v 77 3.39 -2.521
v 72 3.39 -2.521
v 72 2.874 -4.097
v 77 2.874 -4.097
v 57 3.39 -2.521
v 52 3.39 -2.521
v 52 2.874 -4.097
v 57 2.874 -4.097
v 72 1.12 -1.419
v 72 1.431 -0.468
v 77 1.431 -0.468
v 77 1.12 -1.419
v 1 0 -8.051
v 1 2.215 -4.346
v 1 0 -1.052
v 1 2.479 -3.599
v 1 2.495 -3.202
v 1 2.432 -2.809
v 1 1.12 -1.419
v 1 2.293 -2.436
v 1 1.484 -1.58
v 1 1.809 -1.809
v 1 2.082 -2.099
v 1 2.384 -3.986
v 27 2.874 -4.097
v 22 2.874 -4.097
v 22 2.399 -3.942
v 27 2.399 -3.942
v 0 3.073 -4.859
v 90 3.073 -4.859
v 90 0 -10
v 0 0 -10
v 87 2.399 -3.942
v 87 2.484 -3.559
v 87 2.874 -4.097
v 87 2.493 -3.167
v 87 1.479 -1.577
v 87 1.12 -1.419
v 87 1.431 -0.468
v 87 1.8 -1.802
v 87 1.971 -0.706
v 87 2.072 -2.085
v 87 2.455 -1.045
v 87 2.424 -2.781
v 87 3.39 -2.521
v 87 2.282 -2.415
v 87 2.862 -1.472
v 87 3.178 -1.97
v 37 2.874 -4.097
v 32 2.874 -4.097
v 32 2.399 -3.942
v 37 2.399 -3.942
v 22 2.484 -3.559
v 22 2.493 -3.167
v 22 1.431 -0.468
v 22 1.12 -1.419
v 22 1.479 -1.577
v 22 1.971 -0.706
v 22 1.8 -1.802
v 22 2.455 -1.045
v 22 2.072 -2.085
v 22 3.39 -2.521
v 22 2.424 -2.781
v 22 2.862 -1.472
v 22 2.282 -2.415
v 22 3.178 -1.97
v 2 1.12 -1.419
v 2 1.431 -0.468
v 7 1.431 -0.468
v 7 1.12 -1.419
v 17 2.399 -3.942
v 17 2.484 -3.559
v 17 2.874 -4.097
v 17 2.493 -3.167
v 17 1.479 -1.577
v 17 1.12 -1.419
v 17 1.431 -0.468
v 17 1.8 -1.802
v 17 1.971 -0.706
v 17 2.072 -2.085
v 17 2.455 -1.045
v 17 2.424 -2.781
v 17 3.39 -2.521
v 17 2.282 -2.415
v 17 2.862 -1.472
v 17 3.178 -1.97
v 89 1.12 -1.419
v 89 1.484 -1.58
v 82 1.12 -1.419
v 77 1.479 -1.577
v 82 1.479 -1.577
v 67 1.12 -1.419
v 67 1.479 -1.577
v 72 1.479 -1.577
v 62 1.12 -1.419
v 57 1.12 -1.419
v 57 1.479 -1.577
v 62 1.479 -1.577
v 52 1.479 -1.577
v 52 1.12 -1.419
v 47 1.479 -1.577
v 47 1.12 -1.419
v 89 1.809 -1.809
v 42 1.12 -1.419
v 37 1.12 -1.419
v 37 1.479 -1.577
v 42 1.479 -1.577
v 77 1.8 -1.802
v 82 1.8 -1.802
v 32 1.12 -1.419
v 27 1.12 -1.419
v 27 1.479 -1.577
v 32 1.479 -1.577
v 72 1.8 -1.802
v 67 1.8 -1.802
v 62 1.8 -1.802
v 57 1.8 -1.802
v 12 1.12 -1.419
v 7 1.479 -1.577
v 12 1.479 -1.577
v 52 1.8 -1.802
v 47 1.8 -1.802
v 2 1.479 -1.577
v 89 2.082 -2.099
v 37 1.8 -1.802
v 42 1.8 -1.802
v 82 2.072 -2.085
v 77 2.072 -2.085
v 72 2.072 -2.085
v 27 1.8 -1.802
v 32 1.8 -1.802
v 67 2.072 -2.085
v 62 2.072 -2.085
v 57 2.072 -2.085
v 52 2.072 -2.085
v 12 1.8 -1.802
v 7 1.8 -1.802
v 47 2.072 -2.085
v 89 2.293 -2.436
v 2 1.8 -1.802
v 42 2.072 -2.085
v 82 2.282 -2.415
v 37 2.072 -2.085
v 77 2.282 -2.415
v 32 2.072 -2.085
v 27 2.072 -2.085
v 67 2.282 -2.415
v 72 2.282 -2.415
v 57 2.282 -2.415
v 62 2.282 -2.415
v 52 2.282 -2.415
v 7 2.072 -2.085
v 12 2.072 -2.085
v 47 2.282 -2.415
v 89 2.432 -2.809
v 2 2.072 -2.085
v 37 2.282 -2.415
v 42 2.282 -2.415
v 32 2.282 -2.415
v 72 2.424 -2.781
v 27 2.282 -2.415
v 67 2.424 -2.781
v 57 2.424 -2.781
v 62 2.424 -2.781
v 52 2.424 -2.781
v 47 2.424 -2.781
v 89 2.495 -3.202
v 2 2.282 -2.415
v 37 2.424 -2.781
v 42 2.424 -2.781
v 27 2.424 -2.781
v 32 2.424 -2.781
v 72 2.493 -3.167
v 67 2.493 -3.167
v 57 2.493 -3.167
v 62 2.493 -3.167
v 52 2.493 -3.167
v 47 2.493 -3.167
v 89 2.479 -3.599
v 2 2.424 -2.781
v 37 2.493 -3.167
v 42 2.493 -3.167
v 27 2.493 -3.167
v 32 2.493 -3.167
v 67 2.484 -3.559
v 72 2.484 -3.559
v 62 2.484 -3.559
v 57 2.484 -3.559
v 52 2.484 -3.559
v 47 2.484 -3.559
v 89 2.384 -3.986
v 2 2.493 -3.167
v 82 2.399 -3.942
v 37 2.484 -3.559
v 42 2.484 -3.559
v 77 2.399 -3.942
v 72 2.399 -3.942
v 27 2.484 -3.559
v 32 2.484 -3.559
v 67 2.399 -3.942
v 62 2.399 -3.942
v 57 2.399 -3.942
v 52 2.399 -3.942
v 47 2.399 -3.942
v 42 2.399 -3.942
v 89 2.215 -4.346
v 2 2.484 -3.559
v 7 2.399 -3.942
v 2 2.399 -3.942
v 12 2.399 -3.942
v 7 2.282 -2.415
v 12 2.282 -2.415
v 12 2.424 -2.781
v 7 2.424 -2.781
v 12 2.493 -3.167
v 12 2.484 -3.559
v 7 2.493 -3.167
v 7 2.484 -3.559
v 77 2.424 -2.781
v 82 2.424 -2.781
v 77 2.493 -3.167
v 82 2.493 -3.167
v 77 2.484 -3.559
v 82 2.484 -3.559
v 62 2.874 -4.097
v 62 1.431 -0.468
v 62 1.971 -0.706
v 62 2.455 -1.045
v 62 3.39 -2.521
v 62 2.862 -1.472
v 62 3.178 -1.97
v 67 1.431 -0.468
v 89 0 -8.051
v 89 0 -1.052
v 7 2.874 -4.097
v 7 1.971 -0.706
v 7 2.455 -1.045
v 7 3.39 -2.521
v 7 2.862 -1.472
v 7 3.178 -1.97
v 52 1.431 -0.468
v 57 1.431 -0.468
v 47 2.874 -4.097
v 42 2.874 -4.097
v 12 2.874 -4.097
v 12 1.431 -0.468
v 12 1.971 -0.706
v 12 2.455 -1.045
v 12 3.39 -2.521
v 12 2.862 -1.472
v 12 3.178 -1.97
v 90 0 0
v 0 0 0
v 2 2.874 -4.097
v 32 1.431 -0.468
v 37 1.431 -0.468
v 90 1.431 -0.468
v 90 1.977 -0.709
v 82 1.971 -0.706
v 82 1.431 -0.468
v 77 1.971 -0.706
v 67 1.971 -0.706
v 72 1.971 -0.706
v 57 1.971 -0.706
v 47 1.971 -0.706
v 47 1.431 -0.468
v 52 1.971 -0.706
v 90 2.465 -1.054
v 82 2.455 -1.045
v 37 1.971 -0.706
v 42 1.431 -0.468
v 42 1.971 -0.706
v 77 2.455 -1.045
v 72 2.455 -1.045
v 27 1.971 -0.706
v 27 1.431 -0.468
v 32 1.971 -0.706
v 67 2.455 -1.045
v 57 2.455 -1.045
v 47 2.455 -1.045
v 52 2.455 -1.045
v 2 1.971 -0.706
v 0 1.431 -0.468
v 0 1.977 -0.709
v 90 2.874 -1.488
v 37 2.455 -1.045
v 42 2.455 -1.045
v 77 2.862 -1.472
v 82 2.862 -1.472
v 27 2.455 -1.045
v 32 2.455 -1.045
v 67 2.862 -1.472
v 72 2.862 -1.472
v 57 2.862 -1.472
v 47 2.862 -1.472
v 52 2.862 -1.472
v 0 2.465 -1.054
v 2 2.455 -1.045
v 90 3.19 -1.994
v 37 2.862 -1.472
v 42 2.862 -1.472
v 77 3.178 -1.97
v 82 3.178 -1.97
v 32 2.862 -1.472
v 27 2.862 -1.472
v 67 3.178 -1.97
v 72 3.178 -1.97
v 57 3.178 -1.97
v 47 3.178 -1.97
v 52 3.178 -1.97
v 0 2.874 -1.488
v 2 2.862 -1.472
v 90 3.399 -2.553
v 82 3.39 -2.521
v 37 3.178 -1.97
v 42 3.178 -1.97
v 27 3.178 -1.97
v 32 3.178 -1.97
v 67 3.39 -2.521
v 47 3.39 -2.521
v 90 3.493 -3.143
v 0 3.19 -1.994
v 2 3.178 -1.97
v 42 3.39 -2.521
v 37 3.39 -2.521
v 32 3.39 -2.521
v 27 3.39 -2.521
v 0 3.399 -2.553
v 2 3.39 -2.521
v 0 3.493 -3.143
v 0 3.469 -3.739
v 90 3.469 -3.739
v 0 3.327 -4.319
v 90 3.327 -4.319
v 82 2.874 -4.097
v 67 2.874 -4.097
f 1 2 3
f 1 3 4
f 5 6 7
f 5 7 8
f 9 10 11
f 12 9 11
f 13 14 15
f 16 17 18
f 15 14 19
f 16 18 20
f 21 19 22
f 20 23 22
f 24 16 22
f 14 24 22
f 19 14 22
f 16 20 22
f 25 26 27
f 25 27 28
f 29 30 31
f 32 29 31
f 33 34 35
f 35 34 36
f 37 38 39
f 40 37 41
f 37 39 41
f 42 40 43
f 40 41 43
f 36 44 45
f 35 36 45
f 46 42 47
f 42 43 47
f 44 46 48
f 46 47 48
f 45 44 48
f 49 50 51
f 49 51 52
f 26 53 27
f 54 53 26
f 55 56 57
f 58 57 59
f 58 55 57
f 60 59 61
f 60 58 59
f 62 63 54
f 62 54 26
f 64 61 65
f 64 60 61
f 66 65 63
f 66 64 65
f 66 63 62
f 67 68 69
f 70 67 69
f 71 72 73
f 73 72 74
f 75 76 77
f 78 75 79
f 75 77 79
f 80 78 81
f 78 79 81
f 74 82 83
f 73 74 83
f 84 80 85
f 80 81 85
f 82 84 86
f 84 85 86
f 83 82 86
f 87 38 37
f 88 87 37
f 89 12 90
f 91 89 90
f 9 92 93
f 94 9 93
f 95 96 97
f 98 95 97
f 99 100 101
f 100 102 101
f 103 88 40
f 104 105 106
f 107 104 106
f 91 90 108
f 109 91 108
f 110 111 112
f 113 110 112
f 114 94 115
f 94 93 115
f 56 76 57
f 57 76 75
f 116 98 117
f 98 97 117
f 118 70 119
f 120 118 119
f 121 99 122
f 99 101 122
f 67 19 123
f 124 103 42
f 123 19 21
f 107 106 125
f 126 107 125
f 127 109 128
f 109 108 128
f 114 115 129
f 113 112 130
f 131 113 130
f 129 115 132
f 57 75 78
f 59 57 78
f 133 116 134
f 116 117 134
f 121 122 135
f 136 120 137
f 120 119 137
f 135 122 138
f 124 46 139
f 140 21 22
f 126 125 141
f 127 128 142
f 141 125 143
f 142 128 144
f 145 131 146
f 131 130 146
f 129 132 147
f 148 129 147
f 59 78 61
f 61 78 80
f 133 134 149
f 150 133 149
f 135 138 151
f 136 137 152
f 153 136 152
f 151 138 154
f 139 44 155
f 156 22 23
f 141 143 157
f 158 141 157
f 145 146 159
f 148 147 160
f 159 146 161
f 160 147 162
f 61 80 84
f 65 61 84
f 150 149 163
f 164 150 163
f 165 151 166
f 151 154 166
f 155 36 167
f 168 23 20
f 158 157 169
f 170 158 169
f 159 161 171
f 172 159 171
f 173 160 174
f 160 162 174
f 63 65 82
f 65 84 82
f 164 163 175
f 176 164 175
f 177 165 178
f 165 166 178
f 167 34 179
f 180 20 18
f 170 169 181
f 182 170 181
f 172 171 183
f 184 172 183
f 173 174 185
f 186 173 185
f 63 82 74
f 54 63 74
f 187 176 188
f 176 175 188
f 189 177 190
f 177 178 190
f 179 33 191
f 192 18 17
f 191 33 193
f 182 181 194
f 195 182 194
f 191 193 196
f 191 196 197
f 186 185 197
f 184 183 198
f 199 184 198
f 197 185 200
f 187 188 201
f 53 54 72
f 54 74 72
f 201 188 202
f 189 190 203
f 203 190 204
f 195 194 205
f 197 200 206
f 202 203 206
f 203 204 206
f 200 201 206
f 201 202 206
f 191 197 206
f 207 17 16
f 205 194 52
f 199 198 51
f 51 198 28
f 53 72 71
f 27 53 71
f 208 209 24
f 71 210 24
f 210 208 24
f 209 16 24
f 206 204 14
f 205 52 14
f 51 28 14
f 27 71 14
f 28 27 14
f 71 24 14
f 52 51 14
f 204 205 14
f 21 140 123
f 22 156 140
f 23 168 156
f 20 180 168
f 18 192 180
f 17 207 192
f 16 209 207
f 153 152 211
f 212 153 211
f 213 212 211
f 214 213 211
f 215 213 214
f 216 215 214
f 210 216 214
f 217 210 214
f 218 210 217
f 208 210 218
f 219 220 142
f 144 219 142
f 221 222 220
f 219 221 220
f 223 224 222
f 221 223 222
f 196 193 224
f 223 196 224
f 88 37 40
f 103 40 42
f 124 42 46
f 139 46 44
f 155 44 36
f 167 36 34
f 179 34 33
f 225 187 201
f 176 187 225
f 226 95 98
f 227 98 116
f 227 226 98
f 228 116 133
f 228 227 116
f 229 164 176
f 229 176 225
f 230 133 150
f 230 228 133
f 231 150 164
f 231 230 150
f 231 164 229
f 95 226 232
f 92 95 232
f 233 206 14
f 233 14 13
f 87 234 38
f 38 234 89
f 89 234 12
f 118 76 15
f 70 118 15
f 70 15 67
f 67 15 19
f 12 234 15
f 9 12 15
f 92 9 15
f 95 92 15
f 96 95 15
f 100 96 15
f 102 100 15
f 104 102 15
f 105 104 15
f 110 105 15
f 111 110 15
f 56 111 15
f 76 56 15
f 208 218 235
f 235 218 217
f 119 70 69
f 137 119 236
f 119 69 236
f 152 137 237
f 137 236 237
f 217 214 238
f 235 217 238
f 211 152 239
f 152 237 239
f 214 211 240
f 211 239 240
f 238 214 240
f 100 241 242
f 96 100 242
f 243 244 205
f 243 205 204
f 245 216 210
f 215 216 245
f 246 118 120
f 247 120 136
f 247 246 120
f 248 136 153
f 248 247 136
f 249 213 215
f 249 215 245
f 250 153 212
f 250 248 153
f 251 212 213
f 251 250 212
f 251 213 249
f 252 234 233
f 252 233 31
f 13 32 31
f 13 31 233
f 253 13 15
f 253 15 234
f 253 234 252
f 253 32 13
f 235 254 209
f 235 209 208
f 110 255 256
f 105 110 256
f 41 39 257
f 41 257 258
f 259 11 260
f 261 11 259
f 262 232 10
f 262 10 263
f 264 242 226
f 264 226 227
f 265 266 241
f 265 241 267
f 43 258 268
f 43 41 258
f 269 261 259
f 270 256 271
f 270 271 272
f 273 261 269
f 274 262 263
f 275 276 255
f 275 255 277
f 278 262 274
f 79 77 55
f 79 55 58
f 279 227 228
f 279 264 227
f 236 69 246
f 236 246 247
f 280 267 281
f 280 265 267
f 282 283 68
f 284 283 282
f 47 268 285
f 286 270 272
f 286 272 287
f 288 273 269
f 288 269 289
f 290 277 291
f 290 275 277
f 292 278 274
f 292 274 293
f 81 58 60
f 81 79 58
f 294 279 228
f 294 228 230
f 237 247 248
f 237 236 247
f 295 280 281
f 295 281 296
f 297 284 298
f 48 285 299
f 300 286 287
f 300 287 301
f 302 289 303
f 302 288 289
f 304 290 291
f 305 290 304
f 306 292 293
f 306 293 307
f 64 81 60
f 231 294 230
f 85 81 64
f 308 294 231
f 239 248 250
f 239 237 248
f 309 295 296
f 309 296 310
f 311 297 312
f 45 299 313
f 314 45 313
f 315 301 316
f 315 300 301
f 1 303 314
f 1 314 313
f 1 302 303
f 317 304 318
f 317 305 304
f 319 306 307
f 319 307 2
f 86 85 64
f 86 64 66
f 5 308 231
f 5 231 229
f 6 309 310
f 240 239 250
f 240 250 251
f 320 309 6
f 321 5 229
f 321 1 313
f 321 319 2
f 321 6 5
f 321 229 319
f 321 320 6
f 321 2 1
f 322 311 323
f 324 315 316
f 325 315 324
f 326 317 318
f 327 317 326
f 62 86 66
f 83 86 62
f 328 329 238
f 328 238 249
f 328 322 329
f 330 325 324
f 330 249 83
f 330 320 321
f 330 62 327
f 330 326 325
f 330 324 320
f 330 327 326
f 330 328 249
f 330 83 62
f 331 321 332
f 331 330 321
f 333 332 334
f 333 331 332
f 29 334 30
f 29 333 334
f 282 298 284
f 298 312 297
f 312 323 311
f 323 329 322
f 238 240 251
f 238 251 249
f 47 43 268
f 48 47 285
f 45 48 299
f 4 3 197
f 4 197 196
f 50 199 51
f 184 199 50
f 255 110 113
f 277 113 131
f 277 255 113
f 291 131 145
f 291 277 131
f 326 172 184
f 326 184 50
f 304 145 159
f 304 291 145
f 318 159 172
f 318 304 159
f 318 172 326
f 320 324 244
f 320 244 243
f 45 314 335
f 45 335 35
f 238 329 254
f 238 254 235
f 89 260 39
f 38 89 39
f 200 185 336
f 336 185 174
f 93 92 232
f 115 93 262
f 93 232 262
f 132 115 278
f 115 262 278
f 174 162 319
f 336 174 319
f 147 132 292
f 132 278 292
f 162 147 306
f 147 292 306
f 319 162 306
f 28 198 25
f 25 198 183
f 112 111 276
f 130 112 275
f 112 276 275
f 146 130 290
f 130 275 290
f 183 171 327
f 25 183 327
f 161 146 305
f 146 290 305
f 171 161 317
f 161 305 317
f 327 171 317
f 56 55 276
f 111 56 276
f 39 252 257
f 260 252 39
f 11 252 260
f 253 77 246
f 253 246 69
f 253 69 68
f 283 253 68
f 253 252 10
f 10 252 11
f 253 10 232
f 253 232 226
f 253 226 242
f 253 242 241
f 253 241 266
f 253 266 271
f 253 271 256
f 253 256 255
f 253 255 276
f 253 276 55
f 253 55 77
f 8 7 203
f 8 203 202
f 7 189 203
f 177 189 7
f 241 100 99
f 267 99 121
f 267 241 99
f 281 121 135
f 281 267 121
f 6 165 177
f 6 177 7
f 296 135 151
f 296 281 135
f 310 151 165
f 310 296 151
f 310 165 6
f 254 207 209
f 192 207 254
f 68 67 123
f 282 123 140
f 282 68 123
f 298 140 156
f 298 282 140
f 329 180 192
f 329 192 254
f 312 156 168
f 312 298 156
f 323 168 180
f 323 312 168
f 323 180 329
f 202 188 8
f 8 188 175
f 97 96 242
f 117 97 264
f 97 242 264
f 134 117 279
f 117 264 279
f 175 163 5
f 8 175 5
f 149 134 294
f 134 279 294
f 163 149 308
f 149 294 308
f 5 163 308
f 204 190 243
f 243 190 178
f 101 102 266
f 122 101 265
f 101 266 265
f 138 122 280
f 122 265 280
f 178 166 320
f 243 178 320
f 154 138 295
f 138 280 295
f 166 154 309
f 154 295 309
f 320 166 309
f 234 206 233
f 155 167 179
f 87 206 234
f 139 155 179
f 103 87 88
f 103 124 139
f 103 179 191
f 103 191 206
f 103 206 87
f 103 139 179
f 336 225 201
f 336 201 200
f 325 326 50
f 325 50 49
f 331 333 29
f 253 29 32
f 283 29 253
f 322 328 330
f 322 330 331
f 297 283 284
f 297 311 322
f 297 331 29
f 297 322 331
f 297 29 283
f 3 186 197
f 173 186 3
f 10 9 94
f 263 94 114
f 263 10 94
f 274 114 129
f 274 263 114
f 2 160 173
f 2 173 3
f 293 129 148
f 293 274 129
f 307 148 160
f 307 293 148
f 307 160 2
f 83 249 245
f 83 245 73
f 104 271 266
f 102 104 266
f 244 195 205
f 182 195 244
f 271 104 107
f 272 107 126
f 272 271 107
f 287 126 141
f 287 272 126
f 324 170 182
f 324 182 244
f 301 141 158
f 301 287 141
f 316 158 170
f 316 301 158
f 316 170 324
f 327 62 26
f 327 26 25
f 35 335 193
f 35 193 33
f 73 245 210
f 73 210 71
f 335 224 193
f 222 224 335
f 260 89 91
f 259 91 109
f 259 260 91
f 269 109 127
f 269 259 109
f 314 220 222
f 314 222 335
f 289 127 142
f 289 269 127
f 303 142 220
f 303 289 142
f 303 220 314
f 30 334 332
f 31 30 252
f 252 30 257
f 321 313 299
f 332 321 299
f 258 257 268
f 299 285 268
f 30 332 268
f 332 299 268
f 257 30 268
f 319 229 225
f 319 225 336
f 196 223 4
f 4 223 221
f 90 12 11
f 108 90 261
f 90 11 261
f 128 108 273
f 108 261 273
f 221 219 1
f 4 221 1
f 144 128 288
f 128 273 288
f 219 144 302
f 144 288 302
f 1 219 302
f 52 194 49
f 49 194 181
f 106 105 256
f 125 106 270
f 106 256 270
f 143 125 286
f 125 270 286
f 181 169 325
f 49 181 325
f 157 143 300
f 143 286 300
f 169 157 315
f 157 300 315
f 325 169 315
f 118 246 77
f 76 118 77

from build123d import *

# Parameters (mm, degrees)
BOSS_EXTRUDE1_DEPTH = 90
SHELL1_T            = -1
SKETCH2_W           = 5
SKETCH2_H           = 2.5
CUT_EXTRUDE2_DEPTH  = 3


with BuildPart() as part:
    # Sketch1 → Boss-Extrude1 (new body)
    with BuildSketch(Plane(origin=(0, 0, 0), x_dir=(0, 0, -1), z_dir=(1, 0, 0))):
        with BuildLine():
            Line((0, 0), (0.468395453, 1.431403189))
            ThreePointArc((0.468395453, 1.431403189), (2.268780711, 3.308334479), (4.858963514, 3.073363867))
            Line((4.858963514, 3.073363867), (10, 0))
            Line((10, 0), (0, 0))
        make_face()
    extrude(amount=BOSS_EXTRUDE1_DEPTH)

    # Shell1
    shell1_openings = [part.faces().sort_by_distance(p)[0] for p in [
        (45, 0, -5),
    ]]
    offset(amount=SHELL1_T, openings=shell1_openings, kind=Kind.INTERSECTION)

    # Sketch2 → Cut-Extrude2 (cut)
    with BuildSketch(Plane(origin=(0, 0, 0), x_dir=(1, 0, 0), z_dir=(0, 0.311000813, 0.950409645))):
        with Locations((4.5, 2.756090765)):
            Rectangle(SKETCH2_W, SKETCH2_H)
        with Locations((14.5, 2.756090765)):
            Rectangle(SKETCH2_W, SKETCH2_H)
        with Locations((24.5, 2.756090765)):
            Rectangle(SKETCH2_W, SKETCH2_H)
        with Locations((34.5, 2.756090765)):
            Rectangle(SKETCH2_W, SKETCH2_H)
        with Locations((44.5, 2.756090765)):
            Rectangle(SKETCH2_W, SKETCH2_H)
        with Locations((54.5, 2.756090765)):
            Rectangle(SKETCH2_W, SKETCH2_H)
        with Locations((64.5, 2.756090765)):
            Rectangle(SKETCH2_W, SKETCH2_H)
        with Locations((74.5, 2.756090765)):
            Rectangle(SKETCH2_W, SKETCH2_H)
        with Locations((84.5, 2.756090765)):
            Rectangle(SKETCH2_W, SKETCH2_H)
    extrude(amount=-CUT_EXTRUDE2_DEPTH, mode=Mode.SUBTRACT)


solid = part.part
